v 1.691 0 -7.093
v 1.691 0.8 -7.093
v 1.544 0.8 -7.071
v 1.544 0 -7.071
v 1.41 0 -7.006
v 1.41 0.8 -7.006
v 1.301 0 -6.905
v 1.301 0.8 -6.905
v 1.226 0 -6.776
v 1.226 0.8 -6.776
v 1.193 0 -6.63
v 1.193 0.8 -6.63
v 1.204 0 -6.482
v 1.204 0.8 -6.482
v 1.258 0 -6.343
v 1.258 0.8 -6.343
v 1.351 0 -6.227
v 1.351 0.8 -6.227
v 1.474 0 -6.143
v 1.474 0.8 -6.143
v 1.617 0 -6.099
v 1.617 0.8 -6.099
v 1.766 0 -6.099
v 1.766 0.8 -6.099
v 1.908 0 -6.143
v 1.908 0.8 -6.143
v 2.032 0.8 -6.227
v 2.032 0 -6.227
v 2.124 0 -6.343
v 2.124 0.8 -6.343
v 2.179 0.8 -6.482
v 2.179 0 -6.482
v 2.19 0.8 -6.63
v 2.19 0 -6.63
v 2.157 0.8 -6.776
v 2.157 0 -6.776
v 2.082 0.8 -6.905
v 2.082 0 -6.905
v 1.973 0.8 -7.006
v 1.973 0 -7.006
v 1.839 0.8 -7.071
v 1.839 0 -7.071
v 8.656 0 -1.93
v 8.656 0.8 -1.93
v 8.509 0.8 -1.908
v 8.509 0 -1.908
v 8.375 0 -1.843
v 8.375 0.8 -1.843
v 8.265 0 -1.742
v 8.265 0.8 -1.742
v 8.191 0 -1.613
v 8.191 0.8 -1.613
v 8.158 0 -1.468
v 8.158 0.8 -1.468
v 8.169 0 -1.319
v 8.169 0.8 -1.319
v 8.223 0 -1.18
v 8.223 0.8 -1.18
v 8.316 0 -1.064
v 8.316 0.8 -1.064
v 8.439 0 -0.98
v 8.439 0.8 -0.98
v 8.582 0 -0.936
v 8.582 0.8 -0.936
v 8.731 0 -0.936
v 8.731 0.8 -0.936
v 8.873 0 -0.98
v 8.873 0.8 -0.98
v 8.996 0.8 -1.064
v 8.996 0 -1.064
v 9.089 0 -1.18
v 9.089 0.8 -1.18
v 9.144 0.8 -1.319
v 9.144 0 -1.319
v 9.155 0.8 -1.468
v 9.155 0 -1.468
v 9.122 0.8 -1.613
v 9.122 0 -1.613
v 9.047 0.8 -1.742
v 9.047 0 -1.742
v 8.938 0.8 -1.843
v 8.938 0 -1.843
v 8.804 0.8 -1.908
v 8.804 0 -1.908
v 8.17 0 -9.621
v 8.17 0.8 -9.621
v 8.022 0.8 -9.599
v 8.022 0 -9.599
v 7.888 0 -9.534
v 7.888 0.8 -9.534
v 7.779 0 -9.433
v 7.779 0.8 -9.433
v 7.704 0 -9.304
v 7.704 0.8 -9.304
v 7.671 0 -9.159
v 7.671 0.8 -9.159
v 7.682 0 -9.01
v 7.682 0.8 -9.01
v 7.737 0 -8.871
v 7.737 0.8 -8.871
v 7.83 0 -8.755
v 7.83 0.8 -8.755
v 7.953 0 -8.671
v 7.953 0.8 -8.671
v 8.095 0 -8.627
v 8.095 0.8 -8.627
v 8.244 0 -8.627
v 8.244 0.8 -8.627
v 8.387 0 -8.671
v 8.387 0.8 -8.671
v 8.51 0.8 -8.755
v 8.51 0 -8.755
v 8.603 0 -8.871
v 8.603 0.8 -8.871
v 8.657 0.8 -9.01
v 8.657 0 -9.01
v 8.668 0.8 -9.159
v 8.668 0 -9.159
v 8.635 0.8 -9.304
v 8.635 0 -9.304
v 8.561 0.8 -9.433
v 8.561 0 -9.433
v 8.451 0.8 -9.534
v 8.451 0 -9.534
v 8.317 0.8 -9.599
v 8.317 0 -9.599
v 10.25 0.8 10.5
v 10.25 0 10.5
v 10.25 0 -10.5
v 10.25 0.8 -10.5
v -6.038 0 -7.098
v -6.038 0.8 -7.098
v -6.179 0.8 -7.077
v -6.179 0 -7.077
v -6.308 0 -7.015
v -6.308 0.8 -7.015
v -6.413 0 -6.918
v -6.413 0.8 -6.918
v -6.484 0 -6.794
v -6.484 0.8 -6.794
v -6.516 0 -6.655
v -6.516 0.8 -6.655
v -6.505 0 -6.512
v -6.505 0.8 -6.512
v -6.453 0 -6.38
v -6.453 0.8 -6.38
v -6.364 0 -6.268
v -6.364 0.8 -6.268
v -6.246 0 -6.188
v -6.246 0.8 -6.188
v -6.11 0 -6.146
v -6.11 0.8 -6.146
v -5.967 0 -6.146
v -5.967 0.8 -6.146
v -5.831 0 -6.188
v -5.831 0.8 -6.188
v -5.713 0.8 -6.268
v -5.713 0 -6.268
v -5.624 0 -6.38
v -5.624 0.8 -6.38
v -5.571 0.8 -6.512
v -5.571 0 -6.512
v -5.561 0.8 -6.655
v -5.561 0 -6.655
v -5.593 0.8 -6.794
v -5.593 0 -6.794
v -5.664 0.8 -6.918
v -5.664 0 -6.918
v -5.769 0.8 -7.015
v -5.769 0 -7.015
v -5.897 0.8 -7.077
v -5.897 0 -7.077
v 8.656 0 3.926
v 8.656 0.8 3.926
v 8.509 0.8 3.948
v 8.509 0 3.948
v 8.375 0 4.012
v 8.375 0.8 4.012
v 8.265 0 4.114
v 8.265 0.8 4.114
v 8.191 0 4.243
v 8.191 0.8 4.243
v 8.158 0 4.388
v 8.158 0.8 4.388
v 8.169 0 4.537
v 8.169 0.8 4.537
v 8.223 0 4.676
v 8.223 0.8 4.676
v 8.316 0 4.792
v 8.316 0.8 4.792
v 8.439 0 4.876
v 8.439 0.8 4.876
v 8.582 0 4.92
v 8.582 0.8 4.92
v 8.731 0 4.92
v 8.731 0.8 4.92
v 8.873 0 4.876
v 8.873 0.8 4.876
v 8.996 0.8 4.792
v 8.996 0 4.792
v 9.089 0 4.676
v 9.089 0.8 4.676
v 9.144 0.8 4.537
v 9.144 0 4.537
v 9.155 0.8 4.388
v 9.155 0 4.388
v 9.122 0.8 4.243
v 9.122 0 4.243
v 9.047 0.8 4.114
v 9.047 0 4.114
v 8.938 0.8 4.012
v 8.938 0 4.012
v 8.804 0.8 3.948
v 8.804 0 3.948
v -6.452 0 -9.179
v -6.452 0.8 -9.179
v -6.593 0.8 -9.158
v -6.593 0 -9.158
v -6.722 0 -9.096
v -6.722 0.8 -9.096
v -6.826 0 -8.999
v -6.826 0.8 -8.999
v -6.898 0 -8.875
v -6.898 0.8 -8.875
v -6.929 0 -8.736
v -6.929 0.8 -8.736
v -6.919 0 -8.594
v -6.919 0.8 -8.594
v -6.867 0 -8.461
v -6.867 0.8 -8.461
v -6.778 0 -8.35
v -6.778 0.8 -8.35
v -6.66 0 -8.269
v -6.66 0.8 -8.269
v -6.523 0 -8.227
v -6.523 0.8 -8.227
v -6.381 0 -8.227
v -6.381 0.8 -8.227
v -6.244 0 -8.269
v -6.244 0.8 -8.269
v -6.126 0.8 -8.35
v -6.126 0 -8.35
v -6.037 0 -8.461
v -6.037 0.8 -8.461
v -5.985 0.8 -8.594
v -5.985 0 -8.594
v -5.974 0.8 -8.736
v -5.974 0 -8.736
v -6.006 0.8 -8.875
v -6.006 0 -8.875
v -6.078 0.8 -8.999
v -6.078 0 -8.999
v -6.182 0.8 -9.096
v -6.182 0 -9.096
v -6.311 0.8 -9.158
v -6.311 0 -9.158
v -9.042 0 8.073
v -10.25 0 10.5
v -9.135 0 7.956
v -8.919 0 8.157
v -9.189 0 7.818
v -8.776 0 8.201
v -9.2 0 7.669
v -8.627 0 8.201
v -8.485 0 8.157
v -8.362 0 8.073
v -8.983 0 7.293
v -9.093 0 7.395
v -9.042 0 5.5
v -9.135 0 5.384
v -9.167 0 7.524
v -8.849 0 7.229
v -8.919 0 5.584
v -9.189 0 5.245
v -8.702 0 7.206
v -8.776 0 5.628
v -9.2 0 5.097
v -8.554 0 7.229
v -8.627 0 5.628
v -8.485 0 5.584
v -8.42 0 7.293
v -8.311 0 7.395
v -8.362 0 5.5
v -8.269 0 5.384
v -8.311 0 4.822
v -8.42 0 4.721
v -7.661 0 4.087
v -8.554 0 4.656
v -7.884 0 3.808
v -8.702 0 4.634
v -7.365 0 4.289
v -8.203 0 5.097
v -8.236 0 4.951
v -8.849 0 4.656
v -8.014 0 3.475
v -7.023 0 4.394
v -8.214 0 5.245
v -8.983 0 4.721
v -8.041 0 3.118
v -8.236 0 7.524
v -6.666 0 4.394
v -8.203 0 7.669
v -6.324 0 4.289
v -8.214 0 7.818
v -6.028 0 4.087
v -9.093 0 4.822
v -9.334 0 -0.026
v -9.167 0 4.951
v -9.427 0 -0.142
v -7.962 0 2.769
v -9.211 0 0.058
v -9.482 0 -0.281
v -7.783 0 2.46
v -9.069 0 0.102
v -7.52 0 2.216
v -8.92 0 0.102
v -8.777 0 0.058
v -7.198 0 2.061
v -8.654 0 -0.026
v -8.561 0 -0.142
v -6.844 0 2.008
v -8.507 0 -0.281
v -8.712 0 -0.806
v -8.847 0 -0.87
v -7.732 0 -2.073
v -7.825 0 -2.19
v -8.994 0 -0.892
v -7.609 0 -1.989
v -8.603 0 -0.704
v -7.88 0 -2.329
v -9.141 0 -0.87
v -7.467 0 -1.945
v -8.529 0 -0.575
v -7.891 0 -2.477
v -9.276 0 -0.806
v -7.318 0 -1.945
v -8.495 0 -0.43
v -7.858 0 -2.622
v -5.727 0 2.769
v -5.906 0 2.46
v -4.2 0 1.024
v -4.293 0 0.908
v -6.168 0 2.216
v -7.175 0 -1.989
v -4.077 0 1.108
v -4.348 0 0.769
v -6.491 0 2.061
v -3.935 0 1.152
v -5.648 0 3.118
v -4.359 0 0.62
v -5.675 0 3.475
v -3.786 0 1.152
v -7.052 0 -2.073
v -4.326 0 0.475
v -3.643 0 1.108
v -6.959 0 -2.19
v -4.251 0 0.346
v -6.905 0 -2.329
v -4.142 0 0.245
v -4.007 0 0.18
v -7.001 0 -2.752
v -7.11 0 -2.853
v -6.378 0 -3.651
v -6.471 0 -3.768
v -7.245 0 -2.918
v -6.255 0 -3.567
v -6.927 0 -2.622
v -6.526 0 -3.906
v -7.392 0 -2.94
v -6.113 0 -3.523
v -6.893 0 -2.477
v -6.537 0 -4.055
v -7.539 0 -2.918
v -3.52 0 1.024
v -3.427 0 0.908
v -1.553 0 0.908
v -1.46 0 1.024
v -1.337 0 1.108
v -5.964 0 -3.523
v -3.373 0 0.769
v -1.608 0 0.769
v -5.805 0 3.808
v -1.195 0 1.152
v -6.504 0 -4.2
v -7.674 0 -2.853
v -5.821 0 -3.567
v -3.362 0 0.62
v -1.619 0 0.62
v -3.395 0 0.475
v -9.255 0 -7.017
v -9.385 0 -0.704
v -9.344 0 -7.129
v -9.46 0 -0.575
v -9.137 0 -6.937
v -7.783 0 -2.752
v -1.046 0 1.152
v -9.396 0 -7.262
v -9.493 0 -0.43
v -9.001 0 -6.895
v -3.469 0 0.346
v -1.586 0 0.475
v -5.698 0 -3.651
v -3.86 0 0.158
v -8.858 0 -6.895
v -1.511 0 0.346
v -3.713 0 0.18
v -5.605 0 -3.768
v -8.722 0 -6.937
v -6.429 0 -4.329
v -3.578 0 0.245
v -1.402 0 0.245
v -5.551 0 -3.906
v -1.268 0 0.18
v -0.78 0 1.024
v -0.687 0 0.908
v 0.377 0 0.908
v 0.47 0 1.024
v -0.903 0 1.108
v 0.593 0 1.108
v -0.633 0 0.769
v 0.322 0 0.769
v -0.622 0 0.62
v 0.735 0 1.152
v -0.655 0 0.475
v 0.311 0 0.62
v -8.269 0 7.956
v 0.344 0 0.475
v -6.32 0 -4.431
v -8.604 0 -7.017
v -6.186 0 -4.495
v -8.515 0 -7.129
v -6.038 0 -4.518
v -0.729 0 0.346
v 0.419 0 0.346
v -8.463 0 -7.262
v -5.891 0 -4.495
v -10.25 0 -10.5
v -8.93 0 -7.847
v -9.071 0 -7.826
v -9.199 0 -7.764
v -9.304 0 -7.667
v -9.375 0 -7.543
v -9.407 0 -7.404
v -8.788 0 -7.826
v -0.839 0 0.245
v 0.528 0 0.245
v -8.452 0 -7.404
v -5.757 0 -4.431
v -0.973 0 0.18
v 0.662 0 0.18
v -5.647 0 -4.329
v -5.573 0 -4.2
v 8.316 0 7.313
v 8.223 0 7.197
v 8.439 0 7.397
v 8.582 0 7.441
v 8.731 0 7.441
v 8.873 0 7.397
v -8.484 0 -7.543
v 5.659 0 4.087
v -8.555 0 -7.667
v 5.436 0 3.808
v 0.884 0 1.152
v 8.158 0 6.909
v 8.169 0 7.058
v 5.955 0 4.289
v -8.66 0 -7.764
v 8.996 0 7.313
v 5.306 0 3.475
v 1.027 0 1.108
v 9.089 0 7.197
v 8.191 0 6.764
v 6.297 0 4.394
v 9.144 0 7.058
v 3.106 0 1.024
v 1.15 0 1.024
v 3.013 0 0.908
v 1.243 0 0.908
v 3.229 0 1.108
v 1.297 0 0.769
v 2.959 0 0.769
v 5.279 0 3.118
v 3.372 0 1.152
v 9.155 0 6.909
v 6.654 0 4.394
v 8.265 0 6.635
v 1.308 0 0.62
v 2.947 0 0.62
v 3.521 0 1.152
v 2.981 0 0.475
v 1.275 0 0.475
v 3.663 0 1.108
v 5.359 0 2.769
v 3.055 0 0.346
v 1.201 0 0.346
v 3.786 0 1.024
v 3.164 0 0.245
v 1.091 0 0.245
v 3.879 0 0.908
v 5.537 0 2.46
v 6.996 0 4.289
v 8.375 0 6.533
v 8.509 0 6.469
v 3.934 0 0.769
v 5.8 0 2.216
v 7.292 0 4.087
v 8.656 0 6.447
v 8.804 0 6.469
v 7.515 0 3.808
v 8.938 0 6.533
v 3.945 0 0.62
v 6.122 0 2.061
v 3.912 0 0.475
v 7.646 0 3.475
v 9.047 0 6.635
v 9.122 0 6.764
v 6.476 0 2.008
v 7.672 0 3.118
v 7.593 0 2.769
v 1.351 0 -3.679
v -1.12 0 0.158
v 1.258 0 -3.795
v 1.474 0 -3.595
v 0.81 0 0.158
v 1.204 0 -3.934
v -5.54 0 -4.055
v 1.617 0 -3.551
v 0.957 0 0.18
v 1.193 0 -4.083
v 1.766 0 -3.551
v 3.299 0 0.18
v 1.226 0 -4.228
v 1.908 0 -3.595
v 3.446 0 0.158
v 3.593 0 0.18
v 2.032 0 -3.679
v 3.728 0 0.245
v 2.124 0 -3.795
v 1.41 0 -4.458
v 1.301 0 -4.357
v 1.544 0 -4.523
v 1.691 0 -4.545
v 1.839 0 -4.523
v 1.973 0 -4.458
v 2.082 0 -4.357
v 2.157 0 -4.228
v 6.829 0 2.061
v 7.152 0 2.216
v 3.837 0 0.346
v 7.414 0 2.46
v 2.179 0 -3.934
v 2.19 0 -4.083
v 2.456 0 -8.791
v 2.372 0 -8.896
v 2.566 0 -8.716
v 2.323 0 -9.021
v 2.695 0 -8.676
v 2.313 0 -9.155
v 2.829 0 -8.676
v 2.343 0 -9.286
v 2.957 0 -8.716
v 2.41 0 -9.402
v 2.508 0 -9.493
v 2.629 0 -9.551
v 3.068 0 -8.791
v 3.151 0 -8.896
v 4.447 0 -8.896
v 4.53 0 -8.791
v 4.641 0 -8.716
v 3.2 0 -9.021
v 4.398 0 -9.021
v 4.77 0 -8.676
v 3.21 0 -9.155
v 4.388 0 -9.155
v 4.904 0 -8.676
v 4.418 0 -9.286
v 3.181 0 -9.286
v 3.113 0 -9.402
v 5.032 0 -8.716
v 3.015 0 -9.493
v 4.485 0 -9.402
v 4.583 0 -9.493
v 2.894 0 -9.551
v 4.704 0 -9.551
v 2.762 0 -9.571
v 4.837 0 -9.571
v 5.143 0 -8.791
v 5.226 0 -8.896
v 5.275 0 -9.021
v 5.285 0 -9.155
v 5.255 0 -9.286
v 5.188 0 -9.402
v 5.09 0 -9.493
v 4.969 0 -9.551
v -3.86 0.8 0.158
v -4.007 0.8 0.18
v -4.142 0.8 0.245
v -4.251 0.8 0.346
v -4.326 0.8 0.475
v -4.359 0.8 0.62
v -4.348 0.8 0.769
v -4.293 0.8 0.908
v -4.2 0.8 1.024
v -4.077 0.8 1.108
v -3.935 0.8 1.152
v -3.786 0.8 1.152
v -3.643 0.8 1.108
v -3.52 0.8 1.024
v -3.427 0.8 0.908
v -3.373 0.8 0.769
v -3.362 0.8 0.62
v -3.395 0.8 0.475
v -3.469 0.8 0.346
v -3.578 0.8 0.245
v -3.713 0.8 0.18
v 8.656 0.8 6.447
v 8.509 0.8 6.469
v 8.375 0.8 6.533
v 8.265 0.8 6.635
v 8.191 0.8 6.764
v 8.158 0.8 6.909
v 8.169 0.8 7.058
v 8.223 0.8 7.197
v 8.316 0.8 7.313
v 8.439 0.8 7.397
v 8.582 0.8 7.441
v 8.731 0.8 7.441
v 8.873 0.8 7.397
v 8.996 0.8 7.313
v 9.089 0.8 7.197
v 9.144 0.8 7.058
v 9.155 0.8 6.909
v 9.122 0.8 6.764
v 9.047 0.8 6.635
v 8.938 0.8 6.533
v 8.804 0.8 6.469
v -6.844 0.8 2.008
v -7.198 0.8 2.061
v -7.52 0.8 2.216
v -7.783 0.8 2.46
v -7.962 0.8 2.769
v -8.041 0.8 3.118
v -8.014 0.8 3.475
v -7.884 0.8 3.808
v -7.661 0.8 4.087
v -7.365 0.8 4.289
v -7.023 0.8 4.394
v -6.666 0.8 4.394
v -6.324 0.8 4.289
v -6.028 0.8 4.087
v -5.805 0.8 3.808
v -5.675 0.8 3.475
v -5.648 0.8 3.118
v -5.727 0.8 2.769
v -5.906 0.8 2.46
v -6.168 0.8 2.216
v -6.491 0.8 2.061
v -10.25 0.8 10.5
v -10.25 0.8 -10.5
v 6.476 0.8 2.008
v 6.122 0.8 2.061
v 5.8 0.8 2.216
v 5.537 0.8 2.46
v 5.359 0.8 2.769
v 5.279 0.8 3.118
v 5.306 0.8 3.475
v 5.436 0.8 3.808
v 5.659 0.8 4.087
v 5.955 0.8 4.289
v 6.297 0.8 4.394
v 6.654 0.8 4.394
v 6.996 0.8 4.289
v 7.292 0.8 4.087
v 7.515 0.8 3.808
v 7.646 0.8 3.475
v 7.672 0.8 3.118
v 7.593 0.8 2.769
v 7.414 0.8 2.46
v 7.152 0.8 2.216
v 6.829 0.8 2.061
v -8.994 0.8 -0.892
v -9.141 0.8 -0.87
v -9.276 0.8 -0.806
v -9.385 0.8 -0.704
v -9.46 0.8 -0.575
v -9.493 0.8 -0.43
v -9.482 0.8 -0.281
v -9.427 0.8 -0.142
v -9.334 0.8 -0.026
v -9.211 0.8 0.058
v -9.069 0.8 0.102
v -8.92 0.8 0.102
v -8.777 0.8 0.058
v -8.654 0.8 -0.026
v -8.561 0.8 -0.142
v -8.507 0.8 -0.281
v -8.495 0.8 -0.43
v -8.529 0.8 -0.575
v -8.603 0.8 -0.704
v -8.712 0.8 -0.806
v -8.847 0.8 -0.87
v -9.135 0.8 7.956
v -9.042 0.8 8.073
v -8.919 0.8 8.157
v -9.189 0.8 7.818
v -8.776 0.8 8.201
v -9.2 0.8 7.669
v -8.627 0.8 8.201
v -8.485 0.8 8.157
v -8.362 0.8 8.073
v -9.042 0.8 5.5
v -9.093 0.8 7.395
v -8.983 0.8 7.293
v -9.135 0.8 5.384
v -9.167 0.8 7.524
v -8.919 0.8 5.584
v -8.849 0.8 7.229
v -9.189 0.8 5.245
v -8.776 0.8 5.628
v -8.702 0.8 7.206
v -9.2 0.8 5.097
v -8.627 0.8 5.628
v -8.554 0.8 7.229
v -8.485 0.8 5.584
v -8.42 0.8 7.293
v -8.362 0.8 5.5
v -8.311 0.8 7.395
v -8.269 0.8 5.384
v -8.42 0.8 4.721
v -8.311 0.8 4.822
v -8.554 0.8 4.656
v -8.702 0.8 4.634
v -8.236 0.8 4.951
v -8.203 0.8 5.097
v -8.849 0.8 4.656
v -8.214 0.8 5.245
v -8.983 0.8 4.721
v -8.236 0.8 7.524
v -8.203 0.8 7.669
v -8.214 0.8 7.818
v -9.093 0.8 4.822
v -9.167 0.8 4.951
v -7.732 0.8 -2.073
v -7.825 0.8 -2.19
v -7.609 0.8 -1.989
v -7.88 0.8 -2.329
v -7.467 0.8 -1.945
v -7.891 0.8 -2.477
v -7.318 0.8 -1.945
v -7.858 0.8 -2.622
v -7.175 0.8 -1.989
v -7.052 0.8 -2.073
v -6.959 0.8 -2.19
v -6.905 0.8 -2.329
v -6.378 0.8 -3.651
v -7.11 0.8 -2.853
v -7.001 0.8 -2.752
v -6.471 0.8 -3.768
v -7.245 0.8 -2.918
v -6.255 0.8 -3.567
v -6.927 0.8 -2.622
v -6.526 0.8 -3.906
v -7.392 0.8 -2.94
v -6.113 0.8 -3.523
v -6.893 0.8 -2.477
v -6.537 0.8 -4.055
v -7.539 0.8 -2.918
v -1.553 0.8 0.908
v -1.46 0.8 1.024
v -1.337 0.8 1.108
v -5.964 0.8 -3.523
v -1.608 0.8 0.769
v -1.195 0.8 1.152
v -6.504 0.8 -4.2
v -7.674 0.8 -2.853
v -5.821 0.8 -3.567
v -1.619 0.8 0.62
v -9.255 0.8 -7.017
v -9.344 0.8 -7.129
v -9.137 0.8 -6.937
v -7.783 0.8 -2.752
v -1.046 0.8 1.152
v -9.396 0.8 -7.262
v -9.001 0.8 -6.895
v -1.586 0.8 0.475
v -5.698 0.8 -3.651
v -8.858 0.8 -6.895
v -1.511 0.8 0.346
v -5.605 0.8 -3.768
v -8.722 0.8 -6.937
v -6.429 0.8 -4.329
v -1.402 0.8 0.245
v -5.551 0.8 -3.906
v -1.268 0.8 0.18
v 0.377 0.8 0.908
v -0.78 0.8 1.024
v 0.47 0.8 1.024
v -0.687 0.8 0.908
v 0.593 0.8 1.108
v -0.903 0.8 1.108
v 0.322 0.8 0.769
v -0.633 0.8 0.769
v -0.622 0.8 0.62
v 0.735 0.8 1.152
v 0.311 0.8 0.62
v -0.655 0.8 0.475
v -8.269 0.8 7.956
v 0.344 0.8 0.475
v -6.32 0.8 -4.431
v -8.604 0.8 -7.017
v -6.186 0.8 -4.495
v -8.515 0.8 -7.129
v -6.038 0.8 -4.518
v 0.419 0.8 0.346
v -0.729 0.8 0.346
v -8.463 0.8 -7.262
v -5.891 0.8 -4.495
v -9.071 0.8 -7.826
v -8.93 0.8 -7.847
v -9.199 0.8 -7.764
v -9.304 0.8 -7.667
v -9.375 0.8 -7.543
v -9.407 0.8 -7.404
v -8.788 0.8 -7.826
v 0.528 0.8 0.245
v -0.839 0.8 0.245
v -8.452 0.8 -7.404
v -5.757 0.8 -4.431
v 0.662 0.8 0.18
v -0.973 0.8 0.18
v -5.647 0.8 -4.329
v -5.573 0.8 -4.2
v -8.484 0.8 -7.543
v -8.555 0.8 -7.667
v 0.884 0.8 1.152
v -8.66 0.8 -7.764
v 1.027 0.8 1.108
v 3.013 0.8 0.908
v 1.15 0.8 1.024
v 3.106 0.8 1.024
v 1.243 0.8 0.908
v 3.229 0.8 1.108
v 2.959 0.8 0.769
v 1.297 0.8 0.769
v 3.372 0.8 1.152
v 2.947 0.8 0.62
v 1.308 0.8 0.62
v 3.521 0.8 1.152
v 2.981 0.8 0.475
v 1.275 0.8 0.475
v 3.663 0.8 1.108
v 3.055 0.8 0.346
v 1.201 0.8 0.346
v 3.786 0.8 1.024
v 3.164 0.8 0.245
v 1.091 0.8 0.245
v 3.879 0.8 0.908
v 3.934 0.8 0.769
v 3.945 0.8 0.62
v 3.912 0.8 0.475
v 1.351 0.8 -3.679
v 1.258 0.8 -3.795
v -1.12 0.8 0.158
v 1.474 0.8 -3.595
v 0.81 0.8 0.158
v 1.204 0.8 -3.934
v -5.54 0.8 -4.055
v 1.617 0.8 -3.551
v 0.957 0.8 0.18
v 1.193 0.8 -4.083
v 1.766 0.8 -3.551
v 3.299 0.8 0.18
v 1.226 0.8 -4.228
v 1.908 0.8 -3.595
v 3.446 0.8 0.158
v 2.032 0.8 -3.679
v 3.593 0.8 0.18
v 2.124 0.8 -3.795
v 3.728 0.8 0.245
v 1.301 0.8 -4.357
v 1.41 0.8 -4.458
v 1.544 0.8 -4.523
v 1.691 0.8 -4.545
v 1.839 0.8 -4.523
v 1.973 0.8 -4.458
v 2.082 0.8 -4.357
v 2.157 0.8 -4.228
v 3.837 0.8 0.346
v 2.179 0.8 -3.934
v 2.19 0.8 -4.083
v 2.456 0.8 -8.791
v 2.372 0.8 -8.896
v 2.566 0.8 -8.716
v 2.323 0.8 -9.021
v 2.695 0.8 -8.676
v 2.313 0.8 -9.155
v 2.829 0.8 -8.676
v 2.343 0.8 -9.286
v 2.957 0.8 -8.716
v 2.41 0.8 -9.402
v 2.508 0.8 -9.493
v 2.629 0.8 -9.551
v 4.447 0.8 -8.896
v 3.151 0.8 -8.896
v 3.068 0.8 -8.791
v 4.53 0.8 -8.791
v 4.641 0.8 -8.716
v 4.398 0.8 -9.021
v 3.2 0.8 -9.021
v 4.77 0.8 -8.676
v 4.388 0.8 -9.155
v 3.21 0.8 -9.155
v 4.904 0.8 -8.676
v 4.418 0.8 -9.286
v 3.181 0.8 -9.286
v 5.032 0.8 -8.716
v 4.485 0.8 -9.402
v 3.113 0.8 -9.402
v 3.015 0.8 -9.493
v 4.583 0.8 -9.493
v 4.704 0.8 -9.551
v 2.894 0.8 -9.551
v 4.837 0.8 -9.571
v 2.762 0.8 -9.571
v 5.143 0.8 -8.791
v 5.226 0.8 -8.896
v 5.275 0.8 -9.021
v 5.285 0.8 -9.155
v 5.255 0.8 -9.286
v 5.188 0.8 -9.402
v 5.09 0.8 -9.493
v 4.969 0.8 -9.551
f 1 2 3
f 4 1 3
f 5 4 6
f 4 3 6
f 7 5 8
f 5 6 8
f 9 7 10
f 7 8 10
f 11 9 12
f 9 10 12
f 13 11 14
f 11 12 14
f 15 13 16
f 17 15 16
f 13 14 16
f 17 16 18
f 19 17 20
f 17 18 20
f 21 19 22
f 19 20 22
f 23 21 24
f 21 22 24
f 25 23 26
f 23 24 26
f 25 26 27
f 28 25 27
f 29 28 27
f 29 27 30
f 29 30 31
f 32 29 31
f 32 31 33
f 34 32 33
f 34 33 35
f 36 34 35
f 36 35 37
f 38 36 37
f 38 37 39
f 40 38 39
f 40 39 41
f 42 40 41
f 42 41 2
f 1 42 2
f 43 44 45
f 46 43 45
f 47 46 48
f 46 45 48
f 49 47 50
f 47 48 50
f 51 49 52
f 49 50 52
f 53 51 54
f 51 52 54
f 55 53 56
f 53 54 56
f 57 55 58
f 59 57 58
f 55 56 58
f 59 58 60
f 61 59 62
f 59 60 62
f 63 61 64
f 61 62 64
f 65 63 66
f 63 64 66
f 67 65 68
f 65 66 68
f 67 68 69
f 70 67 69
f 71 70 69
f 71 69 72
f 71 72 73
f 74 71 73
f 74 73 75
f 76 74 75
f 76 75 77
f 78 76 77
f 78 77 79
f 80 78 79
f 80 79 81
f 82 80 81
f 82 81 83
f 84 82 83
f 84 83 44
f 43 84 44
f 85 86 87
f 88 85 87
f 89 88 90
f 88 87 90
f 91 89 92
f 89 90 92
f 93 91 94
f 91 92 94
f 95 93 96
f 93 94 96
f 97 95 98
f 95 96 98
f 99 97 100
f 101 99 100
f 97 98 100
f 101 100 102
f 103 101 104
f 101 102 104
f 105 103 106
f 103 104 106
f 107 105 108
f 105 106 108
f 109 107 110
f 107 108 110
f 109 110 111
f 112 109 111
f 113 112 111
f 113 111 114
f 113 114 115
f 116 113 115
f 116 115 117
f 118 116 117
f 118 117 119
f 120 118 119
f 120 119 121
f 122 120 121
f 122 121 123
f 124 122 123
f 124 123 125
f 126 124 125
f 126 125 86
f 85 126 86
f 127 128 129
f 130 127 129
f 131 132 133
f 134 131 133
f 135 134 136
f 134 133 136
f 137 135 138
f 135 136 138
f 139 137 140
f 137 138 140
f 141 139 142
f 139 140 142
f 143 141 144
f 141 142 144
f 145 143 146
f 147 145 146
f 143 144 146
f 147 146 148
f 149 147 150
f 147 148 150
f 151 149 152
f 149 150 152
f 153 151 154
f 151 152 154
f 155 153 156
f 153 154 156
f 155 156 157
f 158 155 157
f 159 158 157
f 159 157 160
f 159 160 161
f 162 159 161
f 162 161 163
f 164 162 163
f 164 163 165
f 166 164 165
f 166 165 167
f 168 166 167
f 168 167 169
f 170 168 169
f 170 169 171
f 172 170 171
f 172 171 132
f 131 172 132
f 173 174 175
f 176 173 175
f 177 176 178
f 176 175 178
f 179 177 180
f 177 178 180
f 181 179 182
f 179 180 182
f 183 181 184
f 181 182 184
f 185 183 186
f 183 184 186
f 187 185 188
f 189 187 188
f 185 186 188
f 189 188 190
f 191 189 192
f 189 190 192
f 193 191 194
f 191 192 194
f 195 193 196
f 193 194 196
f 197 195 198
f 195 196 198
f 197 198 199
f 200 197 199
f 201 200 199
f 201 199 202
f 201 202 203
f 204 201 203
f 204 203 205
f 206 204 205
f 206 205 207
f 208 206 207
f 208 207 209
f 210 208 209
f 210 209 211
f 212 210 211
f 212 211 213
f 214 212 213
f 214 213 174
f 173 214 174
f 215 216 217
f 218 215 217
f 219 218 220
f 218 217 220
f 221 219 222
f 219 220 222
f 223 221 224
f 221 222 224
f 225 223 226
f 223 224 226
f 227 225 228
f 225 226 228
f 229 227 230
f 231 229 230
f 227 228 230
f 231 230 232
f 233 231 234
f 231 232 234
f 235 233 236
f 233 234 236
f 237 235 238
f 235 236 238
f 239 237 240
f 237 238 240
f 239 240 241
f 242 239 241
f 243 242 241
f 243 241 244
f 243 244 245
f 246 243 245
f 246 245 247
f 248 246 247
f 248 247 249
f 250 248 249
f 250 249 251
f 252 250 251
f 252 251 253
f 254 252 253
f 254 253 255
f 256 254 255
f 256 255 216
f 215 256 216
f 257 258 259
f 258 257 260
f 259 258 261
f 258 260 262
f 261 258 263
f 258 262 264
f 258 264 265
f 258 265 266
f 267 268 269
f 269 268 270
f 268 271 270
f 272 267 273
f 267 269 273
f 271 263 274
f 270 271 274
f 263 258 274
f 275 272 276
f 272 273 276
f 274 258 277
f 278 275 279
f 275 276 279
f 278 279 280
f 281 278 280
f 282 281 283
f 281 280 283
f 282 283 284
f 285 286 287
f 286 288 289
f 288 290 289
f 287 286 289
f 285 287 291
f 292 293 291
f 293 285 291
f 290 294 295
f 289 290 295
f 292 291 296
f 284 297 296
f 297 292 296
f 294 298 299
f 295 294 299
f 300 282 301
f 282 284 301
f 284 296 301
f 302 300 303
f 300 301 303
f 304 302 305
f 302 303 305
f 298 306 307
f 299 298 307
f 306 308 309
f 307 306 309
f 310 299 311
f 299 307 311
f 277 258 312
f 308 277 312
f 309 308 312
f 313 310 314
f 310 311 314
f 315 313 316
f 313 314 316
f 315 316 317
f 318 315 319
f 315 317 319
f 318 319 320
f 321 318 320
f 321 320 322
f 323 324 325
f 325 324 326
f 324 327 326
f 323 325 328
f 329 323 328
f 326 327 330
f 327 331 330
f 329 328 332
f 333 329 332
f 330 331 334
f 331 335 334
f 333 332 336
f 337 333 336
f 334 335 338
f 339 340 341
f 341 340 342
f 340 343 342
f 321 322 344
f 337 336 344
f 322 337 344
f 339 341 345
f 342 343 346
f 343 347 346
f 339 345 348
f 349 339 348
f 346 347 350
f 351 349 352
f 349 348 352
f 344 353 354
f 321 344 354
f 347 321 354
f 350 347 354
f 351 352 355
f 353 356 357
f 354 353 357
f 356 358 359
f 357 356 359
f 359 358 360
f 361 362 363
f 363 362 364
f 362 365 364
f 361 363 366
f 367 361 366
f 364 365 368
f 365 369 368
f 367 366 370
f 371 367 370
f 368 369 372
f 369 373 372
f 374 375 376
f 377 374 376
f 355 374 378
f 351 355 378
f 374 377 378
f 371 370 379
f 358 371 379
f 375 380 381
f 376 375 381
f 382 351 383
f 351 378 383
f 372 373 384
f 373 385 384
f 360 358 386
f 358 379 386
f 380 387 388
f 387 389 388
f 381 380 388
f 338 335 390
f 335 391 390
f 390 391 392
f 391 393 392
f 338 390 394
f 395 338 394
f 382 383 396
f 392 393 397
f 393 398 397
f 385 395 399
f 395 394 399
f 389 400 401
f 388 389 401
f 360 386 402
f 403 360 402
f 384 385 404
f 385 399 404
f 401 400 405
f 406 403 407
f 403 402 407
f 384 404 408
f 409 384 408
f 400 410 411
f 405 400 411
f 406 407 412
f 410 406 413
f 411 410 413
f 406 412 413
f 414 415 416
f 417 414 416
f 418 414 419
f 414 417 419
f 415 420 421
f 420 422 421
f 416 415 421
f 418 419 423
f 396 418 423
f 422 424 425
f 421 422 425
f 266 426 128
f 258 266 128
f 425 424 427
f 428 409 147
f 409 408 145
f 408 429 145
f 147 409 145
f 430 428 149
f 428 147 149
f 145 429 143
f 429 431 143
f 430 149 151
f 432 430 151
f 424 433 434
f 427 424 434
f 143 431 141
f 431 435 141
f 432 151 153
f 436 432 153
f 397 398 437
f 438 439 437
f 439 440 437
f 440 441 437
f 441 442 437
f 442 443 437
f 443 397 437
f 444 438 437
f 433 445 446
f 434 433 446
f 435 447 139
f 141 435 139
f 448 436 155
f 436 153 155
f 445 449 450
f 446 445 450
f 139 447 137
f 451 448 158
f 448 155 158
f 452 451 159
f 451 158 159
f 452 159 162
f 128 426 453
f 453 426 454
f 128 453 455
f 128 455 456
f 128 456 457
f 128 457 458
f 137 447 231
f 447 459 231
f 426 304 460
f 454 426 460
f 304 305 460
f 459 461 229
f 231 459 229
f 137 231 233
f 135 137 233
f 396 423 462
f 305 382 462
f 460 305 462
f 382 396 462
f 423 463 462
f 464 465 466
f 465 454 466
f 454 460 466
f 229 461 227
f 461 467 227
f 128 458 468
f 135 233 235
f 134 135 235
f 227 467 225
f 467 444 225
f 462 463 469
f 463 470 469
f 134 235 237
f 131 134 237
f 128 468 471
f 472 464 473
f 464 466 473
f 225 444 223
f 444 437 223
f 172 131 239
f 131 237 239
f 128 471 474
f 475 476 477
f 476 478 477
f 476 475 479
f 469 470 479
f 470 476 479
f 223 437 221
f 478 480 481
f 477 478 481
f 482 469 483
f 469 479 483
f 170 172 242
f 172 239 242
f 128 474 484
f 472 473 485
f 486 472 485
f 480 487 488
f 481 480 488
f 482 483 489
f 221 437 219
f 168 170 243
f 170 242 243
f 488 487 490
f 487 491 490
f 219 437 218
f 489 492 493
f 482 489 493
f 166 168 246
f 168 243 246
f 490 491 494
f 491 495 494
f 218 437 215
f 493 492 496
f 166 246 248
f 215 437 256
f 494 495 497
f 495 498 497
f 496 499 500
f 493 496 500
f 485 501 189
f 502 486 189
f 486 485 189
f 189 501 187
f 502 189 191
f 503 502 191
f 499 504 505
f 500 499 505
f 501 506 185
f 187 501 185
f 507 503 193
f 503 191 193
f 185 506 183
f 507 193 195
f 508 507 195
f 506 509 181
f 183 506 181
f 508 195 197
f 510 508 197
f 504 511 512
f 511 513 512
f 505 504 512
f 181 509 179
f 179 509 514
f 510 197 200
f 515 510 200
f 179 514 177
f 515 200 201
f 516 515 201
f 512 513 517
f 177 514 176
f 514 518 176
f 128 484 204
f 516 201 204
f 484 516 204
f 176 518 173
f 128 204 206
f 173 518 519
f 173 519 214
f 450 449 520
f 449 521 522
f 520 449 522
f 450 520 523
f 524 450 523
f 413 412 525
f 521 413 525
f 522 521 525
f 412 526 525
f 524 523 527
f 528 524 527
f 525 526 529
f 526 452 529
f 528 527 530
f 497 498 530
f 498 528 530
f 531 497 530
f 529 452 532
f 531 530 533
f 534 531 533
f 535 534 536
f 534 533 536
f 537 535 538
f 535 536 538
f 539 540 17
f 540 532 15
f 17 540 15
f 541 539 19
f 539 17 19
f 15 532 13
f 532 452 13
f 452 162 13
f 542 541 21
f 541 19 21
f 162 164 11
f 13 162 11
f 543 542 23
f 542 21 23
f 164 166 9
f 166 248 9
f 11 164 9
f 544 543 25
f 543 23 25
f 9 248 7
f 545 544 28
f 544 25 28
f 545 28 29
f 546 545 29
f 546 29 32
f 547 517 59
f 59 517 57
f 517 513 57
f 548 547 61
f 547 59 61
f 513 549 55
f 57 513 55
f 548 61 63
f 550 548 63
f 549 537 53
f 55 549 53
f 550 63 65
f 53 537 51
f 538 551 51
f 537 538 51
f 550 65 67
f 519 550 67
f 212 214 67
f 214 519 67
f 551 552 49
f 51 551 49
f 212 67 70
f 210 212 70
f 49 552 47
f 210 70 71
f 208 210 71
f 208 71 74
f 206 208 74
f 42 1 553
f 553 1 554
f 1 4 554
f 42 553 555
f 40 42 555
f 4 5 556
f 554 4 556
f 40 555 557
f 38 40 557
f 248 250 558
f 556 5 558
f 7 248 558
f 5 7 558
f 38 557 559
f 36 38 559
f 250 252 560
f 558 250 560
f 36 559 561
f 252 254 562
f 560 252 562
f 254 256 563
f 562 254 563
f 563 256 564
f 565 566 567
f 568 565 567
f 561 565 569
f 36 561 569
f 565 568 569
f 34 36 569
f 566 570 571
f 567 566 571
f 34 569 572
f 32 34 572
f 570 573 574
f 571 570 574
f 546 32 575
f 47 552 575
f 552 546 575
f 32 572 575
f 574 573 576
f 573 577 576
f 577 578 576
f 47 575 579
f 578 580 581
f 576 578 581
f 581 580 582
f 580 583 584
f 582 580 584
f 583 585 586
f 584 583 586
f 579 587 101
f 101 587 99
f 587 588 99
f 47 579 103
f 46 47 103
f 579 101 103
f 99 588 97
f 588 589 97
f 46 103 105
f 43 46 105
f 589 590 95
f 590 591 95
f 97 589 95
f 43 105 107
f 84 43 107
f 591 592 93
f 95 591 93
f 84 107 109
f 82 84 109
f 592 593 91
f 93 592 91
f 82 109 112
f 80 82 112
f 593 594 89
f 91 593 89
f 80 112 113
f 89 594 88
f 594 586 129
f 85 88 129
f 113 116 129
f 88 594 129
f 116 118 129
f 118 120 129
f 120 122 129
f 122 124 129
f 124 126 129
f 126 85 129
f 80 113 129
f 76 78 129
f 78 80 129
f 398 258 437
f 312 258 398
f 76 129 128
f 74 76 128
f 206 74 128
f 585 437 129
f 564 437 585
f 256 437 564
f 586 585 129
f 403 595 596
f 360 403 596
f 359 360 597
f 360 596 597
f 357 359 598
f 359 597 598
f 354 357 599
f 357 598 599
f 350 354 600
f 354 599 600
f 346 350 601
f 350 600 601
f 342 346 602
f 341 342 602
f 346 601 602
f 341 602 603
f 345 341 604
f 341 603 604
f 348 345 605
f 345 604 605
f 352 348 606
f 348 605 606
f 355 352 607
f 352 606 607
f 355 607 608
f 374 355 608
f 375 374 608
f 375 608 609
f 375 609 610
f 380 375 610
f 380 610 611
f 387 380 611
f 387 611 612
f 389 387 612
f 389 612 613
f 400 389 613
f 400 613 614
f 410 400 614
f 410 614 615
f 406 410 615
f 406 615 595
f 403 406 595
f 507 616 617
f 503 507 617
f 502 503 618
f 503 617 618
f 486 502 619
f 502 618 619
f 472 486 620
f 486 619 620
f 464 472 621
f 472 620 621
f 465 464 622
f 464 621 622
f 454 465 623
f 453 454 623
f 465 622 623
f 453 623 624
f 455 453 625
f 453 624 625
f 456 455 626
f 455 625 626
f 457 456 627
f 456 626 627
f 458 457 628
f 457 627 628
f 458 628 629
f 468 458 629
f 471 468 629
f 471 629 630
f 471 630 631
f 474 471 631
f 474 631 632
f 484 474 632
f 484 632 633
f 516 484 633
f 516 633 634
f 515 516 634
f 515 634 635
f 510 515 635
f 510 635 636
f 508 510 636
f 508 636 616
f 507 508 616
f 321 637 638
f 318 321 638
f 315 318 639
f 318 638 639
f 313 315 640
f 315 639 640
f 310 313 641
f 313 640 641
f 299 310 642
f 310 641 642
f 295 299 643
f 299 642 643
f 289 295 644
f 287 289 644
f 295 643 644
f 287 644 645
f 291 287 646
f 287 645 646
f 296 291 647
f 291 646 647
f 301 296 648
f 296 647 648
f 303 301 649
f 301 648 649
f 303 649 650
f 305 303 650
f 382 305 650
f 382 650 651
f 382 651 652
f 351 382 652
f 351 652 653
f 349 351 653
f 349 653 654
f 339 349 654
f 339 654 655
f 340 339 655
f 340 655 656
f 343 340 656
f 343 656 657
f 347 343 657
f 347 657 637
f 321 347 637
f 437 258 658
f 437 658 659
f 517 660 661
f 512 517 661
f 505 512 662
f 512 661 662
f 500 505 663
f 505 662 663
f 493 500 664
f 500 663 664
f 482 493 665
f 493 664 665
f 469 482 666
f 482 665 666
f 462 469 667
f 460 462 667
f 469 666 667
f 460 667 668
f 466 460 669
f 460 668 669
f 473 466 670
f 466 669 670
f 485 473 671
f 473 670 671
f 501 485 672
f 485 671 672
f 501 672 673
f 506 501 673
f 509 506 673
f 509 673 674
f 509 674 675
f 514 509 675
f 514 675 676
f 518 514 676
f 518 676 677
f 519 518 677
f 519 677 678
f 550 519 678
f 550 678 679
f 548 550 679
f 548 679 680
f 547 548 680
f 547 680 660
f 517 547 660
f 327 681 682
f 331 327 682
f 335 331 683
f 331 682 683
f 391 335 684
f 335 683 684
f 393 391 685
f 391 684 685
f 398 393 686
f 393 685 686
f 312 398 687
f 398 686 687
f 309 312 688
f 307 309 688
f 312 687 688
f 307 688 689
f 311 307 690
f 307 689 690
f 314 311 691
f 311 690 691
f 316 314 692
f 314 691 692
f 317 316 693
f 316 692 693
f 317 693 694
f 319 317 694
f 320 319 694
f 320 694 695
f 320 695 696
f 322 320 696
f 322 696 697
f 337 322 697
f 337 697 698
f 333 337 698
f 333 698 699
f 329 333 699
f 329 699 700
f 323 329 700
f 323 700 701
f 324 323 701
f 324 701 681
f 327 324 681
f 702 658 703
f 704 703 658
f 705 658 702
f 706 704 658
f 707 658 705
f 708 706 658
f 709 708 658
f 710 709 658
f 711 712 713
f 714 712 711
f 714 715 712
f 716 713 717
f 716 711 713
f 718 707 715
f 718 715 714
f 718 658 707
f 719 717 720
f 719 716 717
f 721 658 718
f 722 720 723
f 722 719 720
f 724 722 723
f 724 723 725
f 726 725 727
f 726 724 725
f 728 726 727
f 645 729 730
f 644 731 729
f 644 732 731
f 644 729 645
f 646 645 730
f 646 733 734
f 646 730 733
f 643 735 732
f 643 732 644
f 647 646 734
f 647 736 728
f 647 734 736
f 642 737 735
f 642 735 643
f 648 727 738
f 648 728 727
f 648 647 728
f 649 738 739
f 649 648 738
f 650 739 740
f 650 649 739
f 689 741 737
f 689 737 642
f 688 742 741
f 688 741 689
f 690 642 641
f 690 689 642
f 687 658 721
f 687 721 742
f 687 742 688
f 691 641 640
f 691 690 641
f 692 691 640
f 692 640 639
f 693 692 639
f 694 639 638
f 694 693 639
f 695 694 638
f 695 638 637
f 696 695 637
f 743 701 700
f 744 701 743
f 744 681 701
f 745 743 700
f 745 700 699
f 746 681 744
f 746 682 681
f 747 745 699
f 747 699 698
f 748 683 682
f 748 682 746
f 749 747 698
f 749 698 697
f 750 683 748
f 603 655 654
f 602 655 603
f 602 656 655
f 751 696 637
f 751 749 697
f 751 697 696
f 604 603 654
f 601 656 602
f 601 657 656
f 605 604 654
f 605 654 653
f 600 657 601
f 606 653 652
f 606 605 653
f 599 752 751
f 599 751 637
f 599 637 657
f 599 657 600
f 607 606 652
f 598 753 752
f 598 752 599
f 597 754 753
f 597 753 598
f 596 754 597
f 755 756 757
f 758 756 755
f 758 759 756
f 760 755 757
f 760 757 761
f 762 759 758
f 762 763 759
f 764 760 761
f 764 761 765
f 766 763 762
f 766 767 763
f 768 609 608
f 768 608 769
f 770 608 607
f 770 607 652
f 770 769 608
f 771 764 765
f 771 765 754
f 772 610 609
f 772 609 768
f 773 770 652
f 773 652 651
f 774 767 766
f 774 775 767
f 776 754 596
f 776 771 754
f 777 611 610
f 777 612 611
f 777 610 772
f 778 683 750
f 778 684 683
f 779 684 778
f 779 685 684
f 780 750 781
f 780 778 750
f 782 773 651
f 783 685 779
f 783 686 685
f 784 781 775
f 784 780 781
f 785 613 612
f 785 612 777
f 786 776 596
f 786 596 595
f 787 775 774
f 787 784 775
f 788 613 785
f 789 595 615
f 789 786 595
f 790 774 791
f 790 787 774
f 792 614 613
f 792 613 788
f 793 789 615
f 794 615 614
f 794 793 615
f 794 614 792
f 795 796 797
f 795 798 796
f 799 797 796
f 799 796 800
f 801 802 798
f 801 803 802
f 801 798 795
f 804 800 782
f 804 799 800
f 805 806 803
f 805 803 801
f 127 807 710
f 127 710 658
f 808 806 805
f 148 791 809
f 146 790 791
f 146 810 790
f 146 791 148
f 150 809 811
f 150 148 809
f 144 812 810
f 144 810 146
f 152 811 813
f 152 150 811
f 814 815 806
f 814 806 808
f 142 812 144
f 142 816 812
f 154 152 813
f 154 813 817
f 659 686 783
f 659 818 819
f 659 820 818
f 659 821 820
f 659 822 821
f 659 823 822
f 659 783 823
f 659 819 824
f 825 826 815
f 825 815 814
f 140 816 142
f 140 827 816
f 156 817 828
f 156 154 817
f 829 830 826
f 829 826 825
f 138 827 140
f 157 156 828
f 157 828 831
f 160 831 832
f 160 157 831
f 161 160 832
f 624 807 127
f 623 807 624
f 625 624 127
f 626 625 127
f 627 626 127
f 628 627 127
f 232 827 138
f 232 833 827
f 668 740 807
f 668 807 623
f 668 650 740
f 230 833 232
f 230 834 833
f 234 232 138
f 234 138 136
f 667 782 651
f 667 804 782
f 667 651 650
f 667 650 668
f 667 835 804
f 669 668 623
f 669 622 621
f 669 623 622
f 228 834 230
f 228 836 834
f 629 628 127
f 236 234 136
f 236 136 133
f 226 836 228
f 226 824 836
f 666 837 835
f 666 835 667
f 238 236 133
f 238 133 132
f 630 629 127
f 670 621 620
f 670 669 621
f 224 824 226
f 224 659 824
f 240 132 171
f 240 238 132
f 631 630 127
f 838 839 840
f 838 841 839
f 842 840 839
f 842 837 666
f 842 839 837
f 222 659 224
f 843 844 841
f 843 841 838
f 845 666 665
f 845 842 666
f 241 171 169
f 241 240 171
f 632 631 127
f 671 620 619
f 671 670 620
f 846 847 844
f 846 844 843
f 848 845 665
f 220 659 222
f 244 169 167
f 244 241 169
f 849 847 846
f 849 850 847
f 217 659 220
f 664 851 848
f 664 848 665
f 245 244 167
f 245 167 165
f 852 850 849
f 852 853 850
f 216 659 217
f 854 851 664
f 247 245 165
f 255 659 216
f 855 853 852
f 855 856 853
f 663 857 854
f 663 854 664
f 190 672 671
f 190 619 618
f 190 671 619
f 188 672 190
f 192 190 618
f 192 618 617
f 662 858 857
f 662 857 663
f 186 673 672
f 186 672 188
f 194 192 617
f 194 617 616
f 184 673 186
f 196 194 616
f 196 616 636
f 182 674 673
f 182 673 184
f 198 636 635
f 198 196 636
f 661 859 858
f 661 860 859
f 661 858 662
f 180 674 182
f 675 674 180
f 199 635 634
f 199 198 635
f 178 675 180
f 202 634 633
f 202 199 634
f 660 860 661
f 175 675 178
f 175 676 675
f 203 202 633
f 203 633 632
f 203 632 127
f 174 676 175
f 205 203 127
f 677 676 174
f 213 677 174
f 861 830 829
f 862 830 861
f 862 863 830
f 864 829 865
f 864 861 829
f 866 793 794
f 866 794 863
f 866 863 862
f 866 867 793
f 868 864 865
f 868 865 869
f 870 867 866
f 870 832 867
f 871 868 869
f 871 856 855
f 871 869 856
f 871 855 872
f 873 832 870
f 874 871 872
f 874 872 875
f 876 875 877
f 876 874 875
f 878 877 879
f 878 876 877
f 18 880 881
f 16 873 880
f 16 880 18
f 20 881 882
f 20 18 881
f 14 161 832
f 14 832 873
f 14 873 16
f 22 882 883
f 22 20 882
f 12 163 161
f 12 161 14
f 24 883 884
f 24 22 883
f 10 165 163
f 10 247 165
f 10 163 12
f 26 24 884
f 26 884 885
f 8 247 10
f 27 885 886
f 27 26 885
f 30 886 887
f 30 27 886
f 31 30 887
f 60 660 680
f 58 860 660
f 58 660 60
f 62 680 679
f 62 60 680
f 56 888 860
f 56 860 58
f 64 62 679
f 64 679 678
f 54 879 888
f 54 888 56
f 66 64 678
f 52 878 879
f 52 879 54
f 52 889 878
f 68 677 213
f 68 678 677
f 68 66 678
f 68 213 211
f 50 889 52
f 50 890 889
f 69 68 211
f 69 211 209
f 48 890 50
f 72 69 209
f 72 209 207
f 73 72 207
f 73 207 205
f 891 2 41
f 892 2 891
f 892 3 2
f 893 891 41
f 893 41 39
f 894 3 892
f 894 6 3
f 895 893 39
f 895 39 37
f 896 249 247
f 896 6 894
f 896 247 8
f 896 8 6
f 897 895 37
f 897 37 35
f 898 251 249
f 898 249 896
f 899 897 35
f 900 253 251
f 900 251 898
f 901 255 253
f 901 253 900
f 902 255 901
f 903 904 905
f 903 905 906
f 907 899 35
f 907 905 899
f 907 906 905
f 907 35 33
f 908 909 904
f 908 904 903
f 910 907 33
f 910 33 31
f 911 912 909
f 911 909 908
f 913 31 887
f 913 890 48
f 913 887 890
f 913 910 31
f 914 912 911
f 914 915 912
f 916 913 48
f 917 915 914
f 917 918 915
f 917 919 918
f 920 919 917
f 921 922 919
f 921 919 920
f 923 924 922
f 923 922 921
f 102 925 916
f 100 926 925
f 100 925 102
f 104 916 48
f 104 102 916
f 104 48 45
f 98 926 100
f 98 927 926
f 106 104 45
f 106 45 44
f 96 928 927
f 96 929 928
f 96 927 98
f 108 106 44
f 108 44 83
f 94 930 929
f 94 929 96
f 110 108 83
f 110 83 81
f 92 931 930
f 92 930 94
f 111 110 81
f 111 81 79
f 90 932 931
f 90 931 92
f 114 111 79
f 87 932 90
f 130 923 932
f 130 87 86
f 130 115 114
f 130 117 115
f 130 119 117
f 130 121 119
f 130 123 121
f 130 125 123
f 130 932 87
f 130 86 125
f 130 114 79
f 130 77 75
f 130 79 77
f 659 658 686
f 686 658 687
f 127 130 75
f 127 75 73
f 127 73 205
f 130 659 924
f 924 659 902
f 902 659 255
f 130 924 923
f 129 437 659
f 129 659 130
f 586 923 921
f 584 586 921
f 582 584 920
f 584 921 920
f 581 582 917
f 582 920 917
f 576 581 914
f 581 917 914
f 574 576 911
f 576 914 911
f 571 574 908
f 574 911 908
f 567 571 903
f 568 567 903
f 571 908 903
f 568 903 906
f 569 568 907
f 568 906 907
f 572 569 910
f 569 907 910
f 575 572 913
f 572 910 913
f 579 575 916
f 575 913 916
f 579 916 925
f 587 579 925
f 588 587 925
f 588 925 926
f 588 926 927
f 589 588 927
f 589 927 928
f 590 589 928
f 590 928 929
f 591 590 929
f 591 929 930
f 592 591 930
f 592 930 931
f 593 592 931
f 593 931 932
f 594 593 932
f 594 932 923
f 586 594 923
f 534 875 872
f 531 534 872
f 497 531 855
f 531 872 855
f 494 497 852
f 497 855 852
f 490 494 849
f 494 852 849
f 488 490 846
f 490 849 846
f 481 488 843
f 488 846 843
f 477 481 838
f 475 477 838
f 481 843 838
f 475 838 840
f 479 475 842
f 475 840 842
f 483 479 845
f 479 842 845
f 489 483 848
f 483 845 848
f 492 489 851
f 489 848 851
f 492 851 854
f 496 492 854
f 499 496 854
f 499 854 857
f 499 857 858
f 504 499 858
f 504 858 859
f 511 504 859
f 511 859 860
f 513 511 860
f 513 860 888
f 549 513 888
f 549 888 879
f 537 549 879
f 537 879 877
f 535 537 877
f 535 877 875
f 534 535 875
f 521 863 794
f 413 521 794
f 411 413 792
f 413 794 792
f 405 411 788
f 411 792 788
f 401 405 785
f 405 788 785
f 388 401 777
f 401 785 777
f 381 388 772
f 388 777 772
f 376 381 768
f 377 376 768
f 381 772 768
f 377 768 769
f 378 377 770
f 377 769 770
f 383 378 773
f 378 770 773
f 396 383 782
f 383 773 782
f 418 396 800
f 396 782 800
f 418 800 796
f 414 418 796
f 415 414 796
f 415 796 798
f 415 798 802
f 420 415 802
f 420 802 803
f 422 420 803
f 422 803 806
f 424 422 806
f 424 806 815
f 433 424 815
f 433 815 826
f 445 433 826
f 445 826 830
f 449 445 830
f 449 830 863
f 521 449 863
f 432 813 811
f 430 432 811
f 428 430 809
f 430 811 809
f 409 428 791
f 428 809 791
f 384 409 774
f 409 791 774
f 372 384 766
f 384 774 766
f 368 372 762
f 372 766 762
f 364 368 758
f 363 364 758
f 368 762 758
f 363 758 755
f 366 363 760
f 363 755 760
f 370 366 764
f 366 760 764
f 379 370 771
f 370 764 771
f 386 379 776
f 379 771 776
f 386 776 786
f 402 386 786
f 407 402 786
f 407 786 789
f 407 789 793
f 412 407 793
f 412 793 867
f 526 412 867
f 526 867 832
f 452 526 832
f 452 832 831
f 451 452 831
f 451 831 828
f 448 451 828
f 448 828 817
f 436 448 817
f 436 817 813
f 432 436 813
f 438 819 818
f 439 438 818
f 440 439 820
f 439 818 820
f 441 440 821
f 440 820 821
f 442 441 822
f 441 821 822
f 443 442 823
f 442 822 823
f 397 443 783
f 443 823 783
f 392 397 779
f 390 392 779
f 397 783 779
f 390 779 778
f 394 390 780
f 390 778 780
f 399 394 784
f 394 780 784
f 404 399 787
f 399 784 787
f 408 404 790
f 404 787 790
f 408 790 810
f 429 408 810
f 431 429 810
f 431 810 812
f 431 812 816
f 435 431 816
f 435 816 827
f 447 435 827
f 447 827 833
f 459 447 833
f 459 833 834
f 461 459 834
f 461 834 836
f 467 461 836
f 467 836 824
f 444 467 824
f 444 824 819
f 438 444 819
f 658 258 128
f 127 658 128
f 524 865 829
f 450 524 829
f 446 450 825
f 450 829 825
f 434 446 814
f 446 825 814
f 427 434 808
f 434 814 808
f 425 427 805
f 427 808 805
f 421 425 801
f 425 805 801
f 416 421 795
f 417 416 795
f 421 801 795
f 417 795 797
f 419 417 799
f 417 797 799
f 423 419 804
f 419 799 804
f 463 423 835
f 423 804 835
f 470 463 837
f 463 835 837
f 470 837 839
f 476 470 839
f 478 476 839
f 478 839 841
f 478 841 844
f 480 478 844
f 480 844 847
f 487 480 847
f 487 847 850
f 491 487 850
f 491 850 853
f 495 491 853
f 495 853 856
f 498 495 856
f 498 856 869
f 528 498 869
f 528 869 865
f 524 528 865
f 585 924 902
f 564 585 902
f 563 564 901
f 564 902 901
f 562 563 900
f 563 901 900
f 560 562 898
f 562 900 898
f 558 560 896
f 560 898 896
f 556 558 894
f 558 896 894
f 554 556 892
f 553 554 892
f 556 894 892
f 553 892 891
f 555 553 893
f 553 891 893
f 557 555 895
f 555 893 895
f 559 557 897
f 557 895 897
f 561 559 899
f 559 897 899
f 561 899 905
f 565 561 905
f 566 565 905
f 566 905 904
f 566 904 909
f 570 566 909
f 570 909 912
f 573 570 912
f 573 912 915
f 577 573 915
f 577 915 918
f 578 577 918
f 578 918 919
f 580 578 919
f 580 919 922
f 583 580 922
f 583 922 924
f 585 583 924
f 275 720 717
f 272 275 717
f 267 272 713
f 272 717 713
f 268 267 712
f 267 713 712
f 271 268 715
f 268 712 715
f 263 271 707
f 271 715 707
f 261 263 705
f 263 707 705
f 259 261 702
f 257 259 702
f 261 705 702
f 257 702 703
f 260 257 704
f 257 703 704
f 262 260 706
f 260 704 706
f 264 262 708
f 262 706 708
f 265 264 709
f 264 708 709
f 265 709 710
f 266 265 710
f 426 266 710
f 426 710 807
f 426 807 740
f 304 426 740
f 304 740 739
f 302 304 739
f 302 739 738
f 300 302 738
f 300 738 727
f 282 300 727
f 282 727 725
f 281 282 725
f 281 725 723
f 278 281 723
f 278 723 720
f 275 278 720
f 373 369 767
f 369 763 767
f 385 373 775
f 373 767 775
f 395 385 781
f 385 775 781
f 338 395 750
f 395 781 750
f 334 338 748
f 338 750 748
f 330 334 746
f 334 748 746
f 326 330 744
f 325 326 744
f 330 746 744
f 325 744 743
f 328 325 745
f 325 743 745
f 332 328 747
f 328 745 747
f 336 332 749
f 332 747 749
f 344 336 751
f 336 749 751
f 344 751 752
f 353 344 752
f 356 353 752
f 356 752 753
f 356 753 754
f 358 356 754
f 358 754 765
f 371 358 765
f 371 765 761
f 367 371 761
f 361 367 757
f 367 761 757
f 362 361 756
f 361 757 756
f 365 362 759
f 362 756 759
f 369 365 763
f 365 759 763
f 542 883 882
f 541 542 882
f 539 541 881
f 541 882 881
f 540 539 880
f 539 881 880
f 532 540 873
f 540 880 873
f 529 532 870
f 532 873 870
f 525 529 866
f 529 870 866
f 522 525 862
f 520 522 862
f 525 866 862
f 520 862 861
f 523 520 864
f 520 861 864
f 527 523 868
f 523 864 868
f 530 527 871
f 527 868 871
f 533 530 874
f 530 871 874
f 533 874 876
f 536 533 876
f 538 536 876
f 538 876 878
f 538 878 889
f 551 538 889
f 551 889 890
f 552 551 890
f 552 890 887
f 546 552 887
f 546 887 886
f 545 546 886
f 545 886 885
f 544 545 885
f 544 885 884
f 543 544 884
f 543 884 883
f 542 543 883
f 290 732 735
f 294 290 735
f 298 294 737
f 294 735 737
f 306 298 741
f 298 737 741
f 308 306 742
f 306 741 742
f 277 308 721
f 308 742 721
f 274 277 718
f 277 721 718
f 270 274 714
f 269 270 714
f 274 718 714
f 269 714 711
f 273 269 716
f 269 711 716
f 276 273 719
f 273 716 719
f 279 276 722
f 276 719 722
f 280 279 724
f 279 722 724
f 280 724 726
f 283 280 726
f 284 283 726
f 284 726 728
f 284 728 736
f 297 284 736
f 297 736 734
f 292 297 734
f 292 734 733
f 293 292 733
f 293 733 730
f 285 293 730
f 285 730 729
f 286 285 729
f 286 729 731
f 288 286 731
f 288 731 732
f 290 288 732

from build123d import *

# Parameters (mm, degrees)
ESBO_O1_W                = 20.5
ESBO_O1_H                = 21
RESSALTO_EXTRUS_O1_DEPTH = 0.8
ESBO_O2_R                = 0.5
ESBO_O2_R_2              = 1.2
ESBO_O2_R_3              = 0.45
ESBO_O2_R_4              = 0.478821701
CORTE_EXTRUS_O1_DEPTH    = 5


with BuildPart() as part:
    # Esboço1 → Ressalto-extrusão1 (new body)
    with BuildSketch(Plane(origin=(0, 0, 0), x_dir=(1, 0, 0), z_dir=(0, 1, 0))):
        Rectangle(ESBO_O1_W, ESBO_O1_H)
    extrude(amount=RESSALTO_EXTRUS_O1_DEPTH)

    # Esboço2 → Corte-extrusão1 (cut, symmetric)
    with BuildSketch(Plane(origin=(0, 0.8, 0), x_dir=(1, 0, 0), z_dir=(0, 1, 0))):
        with Locations(Location((8.169588965, 9.121369329, 0), (0, 0, 90))):
            Circle(ESBO_O2_R)
        with Locations(Location((8.656271278, 1.430267657, 0), (0, 0, 90))):
            Circle(ESBO_O2_R)
        with Locations(Location((8.656271278, -4.425515861, 0), (0, 0, 90))):
            Circle(ESBO_O2_R)
        with Locations(Location((8.656271278, -6.946579519, 0), (0, 0, 90))):
            Circle(ESBO_O2_R)
        with Locations(Location((6.475637733, -3.207774386, 0), (0, 0, 90))):
            Circle(ESBO_O2_R_2)
        with Locations(Location((-6.84447605, -3.207774386, 0), (0, 0, 90))):
            Circle(ESBO_O2_R_2)
        with Locations(Location((-8.701687341, -5.133968427, 0), (0, 0, 90))):
            Circle(ESBO_O2_R)
        with Locations(Location((-8.701687341, -7.706335777, 0), (0, 0, 90))):
            Circle(ESBO_O2_R)
        with Locations(Location((4.836575481, 9.121369329, 0), (0, 0, 90))):
            Circle(ESBO_O2_R_3)
        with Locations(Location((2.76166475, 9.121369329, 0), (0, 0, 90))):
            Circle(ESBO_O2_R_3)
        with Locations(Location((1.691416538, 6.593096738, 0), (0, 0, 90))):
            Circle(ESBO_O2_R)
        with Locations(Location((-8.994083212, 0.392498409, 0), (0, 0, 90))):
            Circle(ESBO_O2_R)
        with Locations(Location((-3.86010674, -0.657838238, 0), (0, 0, 90))):
            Circle(ESBO_O2_R)
        with Locations(Location((-1.120283175, -0.657838238, 0), (0, 0, 90))):
            Circle(ESBO_O2_R)
        with Locations(Location((0.809655437, -0.657838238, 0), (0, 0, 90))):
            Circle(ESBO_O2_R)
        with Locations(Location((3.446089433, -0.657838238, 0), (0, 0, 90))):
            Circle(ESBO_O2_R)
        with Locations(Location((1.691416538, 4.045324666, 0), (0, 0, 90))):
            Circle(ESBO_O2_R)
        with Locations(Location((-6.451906001, 8.700562352, 0), (0, 0, 90))):
            Circle(ESBO_O2_R_4)
        with Locations(Location((-6.038262859, 6.619037193, 0), (0, 0, 90))):
            Circle(ESBO_O2_R_4)
        with Locations(Location((-8.92956931, 7.368379214, 0), (0, 0, 90))):
            Circle(ESBO_O2_R_4)
        with Locations(Location((-6.038262859, 4.017675665, 0), (0, 0, 90))):
            Circle(ESBO_O2_R)
        with Locations(Location((-7.392078127, 2.439818031, 0), (0, 0, 90))):
            Circle(ESBO_O2_R)
    extrude(amount=CORTE_EXTRUS_O1_DEPTH, both=True, mode=Mode.SUBTRACT)


solid = part.part
